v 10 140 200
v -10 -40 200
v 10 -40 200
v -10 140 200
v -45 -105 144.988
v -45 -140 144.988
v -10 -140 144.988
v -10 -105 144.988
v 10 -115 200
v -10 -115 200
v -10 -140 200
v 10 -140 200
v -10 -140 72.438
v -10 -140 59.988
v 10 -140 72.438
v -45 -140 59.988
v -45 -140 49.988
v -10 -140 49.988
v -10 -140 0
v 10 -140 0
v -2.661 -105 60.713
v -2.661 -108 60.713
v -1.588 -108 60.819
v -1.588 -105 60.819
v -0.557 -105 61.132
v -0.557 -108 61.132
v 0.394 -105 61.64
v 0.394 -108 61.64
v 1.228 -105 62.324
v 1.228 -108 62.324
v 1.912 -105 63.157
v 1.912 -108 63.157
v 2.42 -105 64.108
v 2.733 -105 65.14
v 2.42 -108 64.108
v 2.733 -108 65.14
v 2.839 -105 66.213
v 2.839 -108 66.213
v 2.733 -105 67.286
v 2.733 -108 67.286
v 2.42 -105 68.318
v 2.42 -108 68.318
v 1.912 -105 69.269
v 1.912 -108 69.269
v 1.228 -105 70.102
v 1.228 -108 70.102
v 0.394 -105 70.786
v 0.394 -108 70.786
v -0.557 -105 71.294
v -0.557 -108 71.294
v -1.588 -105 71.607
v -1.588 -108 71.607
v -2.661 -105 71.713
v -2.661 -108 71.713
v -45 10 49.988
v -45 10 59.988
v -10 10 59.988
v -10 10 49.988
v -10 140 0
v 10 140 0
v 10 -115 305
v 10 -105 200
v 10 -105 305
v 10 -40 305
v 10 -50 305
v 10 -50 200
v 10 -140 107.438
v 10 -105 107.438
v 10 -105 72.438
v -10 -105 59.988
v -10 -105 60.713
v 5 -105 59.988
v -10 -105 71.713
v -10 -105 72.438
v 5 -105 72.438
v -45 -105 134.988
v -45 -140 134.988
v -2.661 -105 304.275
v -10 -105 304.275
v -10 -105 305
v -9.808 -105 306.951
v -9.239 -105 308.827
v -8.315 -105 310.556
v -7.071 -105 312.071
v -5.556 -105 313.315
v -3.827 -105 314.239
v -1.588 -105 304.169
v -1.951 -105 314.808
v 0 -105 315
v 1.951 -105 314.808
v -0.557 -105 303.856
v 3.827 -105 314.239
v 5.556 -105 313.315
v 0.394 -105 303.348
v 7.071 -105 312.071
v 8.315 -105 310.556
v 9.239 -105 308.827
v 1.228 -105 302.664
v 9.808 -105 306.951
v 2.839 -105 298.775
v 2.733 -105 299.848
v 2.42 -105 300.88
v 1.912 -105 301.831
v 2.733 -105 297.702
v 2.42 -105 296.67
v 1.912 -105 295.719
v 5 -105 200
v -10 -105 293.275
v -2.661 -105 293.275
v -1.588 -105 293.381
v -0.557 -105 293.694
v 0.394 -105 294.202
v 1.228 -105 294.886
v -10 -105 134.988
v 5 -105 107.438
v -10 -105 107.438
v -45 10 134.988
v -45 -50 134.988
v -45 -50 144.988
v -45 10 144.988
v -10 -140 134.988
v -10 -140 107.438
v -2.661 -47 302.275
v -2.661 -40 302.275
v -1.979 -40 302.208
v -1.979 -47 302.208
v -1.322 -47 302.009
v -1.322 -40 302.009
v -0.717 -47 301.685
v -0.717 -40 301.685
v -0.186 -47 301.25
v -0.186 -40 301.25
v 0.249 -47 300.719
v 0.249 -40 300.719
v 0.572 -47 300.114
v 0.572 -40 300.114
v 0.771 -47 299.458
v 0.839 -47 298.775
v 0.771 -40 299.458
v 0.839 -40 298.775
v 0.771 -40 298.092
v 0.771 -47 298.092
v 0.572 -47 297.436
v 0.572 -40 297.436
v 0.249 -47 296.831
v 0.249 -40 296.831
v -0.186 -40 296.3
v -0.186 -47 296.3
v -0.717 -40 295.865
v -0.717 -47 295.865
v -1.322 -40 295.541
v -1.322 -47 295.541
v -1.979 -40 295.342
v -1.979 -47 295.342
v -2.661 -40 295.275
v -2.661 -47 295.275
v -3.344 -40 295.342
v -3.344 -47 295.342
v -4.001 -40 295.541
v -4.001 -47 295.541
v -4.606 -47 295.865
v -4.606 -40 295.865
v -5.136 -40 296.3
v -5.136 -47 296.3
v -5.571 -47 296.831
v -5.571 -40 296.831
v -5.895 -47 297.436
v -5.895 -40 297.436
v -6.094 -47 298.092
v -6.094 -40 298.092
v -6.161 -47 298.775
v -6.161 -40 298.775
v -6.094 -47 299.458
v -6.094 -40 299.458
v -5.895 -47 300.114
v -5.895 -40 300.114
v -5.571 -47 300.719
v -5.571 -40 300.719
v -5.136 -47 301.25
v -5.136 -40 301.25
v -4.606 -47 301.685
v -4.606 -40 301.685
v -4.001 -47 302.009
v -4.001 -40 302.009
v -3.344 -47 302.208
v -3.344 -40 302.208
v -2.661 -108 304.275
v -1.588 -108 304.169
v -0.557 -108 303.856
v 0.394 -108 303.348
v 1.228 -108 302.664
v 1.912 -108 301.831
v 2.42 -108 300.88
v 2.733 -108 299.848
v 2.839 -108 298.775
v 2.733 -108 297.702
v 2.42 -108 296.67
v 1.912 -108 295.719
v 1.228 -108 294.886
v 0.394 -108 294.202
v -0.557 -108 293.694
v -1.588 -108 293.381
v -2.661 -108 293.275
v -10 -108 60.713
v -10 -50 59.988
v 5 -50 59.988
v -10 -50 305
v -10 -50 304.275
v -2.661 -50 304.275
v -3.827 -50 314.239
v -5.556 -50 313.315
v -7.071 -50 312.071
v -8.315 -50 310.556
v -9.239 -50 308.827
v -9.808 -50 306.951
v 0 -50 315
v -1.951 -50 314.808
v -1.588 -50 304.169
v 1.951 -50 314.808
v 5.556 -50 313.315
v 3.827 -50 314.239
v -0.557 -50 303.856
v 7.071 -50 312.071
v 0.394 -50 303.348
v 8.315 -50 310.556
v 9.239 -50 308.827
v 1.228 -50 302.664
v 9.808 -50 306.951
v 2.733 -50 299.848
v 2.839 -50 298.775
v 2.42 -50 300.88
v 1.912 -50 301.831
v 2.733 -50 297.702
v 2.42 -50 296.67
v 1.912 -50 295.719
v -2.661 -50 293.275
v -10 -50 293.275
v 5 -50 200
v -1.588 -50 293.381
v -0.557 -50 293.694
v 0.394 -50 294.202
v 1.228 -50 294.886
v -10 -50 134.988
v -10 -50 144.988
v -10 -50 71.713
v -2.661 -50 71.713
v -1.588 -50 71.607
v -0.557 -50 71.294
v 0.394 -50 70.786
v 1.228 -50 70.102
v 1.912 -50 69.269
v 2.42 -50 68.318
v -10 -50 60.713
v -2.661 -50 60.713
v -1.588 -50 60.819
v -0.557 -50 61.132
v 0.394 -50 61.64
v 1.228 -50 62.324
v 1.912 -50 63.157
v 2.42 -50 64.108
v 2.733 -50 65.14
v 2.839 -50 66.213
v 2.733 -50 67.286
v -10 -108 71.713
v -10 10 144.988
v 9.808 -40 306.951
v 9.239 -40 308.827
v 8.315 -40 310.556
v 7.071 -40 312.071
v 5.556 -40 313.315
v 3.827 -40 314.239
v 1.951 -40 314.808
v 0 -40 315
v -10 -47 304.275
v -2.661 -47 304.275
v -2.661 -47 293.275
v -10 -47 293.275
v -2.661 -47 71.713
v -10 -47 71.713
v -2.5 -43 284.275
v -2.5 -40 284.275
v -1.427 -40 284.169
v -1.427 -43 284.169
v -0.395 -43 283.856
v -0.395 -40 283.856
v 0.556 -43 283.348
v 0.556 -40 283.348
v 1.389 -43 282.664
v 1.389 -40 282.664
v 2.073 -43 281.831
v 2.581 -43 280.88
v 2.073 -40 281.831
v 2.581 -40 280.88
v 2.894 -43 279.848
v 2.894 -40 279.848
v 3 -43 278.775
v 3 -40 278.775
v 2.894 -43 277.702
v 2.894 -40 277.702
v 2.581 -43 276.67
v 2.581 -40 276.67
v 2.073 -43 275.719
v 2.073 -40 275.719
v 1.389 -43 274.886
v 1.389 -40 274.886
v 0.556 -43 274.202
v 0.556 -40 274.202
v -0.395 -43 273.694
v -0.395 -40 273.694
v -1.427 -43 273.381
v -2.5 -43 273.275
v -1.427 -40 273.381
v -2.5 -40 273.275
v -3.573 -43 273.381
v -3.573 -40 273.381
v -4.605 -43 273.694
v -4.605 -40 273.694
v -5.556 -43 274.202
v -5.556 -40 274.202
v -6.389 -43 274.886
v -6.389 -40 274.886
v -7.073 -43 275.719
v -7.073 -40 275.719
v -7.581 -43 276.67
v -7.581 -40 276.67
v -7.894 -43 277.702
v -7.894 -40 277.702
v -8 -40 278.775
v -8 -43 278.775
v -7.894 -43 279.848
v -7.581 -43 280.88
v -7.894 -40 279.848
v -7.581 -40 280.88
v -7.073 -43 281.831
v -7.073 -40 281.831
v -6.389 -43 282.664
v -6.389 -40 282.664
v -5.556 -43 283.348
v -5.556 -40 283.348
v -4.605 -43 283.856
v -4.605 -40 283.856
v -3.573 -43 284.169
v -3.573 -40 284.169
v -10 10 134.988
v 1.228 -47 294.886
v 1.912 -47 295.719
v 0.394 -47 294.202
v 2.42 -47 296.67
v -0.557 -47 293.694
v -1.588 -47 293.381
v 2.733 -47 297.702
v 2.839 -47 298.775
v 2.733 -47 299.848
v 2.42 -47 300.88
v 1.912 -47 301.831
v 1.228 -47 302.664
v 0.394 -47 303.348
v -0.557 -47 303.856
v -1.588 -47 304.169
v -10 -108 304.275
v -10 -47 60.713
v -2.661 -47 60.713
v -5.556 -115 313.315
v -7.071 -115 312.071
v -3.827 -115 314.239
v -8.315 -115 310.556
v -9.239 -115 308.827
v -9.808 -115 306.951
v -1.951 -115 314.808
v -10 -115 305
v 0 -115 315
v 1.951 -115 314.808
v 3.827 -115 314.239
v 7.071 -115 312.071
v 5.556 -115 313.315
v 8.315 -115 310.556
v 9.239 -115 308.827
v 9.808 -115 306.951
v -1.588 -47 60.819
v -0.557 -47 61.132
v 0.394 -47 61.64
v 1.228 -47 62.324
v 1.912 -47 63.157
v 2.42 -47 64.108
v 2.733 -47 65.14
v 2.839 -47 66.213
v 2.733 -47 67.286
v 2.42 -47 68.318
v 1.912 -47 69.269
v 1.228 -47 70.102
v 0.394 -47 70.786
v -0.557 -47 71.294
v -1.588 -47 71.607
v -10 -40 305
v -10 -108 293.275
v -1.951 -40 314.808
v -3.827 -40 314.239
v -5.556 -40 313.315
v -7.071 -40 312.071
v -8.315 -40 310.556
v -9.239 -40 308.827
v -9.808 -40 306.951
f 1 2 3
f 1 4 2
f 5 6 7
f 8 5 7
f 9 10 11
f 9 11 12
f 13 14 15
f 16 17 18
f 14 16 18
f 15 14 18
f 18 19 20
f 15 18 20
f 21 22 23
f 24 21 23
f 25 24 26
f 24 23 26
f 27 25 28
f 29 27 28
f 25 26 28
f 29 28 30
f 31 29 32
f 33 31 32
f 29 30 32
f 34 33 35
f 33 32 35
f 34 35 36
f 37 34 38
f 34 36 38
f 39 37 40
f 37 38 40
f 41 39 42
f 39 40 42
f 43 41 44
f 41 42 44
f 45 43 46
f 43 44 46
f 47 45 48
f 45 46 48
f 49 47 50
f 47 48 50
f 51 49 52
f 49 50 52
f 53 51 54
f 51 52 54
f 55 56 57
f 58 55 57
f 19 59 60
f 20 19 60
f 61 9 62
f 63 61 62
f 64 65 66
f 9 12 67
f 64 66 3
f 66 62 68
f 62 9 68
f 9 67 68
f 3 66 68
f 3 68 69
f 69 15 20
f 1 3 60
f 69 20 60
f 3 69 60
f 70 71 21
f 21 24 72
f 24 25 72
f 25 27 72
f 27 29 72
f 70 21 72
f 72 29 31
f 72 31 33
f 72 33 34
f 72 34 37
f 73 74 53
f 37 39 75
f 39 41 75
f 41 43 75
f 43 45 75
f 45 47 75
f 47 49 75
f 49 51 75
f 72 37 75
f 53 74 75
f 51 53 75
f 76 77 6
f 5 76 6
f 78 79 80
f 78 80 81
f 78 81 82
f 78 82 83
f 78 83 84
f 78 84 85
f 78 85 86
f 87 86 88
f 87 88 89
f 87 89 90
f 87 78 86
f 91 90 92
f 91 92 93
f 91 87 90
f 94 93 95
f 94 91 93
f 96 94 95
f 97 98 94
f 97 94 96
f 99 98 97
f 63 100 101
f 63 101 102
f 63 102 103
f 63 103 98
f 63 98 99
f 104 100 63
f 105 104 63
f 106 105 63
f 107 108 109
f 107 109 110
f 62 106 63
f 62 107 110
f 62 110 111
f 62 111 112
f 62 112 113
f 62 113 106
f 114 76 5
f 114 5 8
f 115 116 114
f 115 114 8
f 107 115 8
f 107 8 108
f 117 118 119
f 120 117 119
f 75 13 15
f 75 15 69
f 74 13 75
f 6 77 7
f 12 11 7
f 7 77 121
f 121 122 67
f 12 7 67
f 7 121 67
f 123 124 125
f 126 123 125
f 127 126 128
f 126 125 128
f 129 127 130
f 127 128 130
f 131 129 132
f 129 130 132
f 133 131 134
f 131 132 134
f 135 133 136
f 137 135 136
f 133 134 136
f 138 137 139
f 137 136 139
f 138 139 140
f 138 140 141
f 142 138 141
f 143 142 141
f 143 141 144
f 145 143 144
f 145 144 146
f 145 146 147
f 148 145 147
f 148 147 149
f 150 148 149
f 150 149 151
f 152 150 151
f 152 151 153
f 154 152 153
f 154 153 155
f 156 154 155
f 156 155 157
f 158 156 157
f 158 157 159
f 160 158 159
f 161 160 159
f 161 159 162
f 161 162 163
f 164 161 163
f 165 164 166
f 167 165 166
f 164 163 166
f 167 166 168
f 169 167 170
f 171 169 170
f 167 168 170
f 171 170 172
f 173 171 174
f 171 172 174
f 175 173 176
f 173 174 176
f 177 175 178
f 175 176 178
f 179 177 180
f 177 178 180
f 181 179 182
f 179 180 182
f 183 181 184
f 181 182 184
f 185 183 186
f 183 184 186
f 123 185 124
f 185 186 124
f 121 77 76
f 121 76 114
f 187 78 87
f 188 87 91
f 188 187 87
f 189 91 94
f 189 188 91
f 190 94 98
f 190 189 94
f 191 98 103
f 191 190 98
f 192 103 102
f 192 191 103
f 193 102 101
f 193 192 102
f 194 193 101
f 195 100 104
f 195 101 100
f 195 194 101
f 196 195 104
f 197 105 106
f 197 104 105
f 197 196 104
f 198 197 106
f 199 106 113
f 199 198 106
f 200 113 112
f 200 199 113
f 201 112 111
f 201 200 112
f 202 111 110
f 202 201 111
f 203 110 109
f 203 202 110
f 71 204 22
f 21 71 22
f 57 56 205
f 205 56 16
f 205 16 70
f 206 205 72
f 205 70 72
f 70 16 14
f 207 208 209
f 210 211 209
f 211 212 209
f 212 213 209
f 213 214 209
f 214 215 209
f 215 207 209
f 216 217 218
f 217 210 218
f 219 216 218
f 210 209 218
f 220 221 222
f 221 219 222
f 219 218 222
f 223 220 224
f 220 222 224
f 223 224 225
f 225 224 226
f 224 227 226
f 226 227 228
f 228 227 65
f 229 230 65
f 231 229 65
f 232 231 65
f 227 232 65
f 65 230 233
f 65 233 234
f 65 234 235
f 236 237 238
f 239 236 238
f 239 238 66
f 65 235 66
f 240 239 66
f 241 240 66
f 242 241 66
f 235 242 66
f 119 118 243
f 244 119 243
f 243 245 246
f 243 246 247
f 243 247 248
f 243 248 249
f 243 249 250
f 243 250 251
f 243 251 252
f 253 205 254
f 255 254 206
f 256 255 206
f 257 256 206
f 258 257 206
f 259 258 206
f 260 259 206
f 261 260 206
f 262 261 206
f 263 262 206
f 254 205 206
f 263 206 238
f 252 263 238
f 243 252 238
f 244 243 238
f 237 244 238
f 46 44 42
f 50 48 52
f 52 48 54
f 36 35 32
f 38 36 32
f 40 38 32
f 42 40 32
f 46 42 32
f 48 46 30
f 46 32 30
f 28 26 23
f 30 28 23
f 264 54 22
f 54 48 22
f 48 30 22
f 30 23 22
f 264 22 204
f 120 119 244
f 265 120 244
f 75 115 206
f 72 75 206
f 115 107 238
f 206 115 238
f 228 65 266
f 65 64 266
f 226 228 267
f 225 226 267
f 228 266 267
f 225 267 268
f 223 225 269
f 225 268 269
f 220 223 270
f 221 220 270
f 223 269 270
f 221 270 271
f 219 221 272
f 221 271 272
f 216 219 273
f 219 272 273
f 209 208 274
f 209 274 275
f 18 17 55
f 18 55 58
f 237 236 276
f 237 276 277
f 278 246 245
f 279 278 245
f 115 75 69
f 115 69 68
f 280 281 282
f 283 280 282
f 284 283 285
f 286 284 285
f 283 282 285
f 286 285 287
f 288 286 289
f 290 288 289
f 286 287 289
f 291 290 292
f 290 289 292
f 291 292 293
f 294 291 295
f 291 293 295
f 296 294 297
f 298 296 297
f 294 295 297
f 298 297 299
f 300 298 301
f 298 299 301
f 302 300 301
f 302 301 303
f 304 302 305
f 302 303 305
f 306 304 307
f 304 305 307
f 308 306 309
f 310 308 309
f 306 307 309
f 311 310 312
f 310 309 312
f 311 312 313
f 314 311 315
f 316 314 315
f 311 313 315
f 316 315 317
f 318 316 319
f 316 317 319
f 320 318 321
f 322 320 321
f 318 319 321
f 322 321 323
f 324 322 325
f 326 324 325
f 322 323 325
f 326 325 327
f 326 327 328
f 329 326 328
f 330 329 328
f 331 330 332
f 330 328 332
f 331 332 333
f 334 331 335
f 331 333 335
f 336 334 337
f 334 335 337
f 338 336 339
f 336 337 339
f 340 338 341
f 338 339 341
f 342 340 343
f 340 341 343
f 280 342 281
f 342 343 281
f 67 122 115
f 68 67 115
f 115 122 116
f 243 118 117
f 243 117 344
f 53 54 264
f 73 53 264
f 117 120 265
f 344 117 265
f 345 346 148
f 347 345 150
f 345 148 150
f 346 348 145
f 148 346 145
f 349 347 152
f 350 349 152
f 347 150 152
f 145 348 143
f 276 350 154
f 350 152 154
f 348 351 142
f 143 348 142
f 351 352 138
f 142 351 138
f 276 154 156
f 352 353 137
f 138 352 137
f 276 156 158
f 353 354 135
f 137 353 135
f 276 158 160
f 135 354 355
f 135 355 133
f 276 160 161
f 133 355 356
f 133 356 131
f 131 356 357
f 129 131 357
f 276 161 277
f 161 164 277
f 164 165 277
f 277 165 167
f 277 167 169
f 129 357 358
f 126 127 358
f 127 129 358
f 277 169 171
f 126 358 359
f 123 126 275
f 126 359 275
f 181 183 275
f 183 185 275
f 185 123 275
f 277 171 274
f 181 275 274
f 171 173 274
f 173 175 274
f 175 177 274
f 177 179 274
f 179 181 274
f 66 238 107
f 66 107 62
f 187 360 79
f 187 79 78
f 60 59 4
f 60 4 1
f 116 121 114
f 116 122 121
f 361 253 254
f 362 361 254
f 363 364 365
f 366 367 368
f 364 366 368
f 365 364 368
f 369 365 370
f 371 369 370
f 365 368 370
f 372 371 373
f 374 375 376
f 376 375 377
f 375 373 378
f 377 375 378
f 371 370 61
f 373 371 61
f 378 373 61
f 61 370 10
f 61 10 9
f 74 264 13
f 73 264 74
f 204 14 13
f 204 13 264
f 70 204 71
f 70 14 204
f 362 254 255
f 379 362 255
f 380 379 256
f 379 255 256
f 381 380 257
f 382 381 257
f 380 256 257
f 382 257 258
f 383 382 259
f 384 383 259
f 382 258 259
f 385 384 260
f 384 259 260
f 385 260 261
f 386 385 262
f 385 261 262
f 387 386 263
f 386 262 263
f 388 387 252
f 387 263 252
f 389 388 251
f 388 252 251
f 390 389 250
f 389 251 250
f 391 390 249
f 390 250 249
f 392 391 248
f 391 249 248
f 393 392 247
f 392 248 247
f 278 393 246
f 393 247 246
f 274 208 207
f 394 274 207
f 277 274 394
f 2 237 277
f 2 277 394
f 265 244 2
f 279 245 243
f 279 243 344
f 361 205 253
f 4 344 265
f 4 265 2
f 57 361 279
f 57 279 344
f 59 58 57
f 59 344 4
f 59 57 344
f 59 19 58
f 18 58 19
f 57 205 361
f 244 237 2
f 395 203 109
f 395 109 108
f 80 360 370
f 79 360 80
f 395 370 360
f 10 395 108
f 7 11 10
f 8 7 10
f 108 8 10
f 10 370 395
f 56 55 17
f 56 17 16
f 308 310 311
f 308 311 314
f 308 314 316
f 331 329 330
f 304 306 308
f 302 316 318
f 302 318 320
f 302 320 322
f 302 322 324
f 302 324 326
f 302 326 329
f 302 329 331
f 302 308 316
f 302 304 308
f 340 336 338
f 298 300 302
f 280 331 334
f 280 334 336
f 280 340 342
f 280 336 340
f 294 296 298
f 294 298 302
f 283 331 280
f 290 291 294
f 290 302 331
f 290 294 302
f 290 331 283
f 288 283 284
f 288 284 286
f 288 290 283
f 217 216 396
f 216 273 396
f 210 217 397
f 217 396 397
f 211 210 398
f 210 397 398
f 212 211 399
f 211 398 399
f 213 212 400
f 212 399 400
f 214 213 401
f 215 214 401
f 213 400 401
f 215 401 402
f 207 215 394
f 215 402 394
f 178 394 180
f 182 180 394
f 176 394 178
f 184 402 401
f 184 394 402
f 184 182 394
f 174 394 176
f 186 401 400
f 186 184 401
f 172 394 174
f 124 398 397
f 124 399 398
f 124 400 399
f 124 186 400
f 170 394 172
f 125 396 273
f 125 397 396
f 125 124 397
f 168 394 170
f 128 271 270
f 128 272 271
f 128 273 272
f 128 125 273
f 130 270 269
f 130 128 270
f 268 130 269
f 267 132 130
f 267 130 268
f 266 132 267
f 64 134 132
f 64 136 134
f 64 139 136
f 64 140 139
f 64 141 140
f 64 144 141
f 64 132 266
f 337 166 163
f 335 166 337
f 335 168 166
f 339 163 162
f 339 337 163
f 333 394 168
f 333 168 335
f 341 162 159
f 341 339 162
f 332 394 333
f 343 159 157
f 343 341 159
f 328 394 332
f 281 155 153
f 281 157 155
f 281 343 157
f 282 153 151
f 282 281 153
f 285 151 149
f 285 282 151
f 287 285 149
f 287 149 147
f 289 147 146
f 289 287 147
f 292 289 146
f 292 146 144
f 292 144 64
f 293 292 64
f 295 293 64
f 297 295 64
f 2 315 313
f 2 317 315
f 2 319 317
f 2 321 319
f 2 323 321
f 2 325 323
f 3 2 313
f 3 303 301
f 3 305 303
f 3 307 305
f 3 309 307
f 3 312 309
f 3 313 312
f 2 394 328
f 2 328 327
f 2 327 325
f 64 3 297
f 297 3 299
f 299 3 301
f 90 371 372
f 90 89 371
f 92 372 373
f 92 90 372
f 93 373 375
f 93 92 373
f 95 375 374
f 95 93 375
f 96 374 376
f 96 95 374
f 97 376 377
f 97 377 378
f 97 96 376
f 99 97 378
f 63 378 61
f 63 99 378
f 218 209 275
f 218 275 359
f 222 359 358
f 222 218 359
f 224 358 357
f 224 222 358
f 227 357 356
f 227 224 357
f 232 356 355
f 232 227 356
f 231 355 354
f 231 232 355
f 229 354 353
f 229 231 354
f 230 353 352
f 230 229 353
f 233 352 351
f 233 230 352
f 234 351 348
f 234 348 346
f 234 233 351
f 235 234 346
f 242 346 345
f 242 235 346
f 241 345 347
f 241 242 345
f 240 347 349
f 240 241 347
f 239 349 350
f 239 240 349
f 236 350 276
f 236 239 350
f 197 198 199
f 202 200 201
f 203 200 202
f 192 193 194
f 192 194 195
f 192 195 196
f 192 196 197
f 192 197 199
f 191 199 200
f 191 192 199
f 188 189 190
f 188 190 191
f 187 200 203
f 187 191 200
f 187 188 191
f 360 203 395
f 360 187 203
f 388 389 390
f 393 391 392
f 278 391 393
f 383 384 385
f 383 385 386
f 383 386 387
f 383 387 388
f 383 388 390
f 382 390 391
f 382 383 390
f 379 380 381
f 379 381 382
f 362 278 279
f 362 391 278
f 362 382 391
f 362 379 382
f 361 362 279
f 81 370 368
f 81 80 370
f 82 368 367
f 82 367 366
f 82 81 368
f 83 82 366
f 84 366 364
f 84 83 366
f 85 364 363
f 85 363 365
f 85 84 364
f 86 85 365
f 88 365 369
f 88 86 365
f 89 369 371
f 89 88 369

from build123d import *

# Parameters (mm, degrees)
SKETCH_1_W          = 20
SKETCH_1_H          = 280
EXTRUDE_1_DEPTH     = 200
SKETCH_2_W          = 35
SKETCH_2_H          = 35
CUT_EXTRUDE_1_DEPTH = 245.948974278
SKETCH_4_W          = 35
SKETCH_4_H          = 10
EXTRUDE_2_DEPTH     = 150
SKETCH_5_W          = 35
SKETCH_5_H          = 55
CUT_EXTRUDE_3_DEPTH = 24
CUT_EXTRUDE_4_REACH = 250.244
SKETCH_6_W          = 15
SKETCH_6_H          = 55
CUT_EXTRUDE_START   = -3
CUT_EXTRUDE_5_DEPTH = 61
SKETCH_9_W          = 20
SKETCH_9_H          = 10
EXTRUDE_3_DEPTH     = 115
SKETCH_10_R         = 3.5
CUT_EXTRUDE_7_DEPTH = 20
SKETCH_11_R         = 5.5
CUT_EXTRUDE_8_DEPTH = 3
FILLET_1_R          = 10


with BuildPart() as part:
    # 草图1 → 凸台-拉伸1 (new body)
    with BuildSketch(Plane.XY):
        Rectangle(SKETCH_1_W, SKETCH_1_H)
    extrude(amount=EXTRUDE_1_DEPTH)

    # 草图2 → 切除-拉伸1 (cut, through all)
    with BuildSketch(Plane.ZY.offset(10)):
        with Locations((89.937894672, -122.5)):
            Rectangle(SKETCH_2_W, SKETCH_2_H)
    extrude(amount=-CUT_EXTRUDE_1_DEPTH, mode=Mode.SUBTRACT)

    # 草图4 → 凸台-拉伸2 (add)
    with BuildSketch(Plane.XZ.offset(140)):
        with Locations((-27.5, 54.987894672)):
            Rectangle(SKETCH_4_W, SKETCH_4_H)
        with Locations((-27.5, 139.987894672)):
            Rectangle(SKETCH_4_W, SKETCH_4_H)
    extrude(amount=-EXTRUDE_2_DEPTH)

    # 草图5 → 切除-拉伸3 (cut)
    with BuildSketch(Plane.XY.offset(144.987894672)):
        with Locations((-27.5, -77.5)):
            Rectangle(SKETCH_5_W, SKETCH_5_H)
    extrude(amount=-CUT_EXTRUDE_3_DEPTH, mode=Mode.SUBTRACT)

    # 切除-拉伸4: up to this face of the body (flat: up to its plane)
    cut_extrude_4_end = Plane(part.part.faces().sort_by_distance((-27.5, -65, 59.987894672))[0])
    # 草图6 → 切除-拉伸4 (cut, up to the picked face)
    with BuildSketch(Plane.XY.offset(200), mode=Mode.PRIVATE) as cut_extrude_4_sk1:
        with Locations((-2.5, -77.5)):
            Rectangle(SKETCH_6_W, SKETCH_6_H)
    cut_extrude_4_tool1 = split(extrude(cut_extrude_4_sk1.sketch, amount=-CUT_EXTRUDE_4_REACH, mode=Mode.PRIVATE), bisect_by=cut_extrude_4_end, keep=Keep.BOTH, mode=Mode.PRIVATE)
    add(cut_extrude_4_tool1.solids().sort_by(Axis((-2.5, -77.5, 200), (0, 0, -1)))[0], mode=Mode.SUBTRACT)

    # 草图7 → 切除-拉伸5 (cut)
    with BuildSketch(Plane(origin=(0, -105, 0), x_dir=(1, 0, 0), z_dir=(0, 1, 0)).offset(CUT_EXTRUDE_START)):
        with BuildLine():
            Line((-2.661336035, -71.712894672), (-10, -71.712894672))
            Line((-10, -71.712894672), (-10, -60.712894672))
            Line((-10, -60.712894672), (-2.661336035, -60.712894672))
            ThreePointArc((-2.661336035, -60.712894672), (2.838663965, -66.212894672), (-2.661336035, -71.712894672))
        make_face()
    cut_extrude_5 = extrude(amount=CUT_EXTRUDE_5_DEPTH, mode=Mode.SUBTRACT)

    # 草图9 → 凸台-拉伸3 (add)
    with BuildSketch(Plane.XY.offset(200)):
        with Locations((0, -110)):
            Rectangle(SKETCH_9_W, SKETCH_9_H)
        with Locations((0, -45)):
            Rectangle(SKETCH_9_W, SKETCH_9_H)
    extrude(amount=EXTRUDE_3_DEPTH)

    # 镜向1: 切除-拉伸5 across plane
    add(cut_extrude_5.mirror(Plane(origin=(0, 0, 182.493947336), x_dir=(1, 0, 0), z_dir=(0, 0, -1))), mode=Mode.SUBTRACT)

    # 草图10 → 切除-拉伸7 (cut)
    with BuildSketch(Plane(origin=(0, -40, 0), x_dir=(1, 0, 0), z_dir=(0, 1, 0))):
        with Locations(Location((-2.661336035, -298.775, 0), (0, 0, 270))):
            Circle(SKETCH_10_R)
    extrude(amount=-CUT_EXTRUDE_7_DEPTH, mode=Mode.SUBTRACT)

    # 草图11 → 切除-拉伸8 (cut)
    with BuildSketch(Plane(origin=(0, -40, 0), x_dir=(1, 0, 0), z_dir=(0, 1, 0))):
        with Locations(Location((-2.5, -278.775, 0), (0, 0, 270))):
            Circle(SKETCH_11_R)
    extrude(amount=-CUT_EXTRUDE_8_DEPTH, mode=Mode.SUBTRACT)

    # 圆角1
    fillet_1_edges = [part.edges().sort_by_distance(p)[0] for p in [
        (10, -45, 315),
        (10, -110, 315),
        (-10, -45, 315),
        (-10, -110, 315),
    ]]
    fillet(fillet_1_edges, radius=FILLET_1_R - 0.0001)  # a hair under: the kernel refuses the full size


solid = part.part
